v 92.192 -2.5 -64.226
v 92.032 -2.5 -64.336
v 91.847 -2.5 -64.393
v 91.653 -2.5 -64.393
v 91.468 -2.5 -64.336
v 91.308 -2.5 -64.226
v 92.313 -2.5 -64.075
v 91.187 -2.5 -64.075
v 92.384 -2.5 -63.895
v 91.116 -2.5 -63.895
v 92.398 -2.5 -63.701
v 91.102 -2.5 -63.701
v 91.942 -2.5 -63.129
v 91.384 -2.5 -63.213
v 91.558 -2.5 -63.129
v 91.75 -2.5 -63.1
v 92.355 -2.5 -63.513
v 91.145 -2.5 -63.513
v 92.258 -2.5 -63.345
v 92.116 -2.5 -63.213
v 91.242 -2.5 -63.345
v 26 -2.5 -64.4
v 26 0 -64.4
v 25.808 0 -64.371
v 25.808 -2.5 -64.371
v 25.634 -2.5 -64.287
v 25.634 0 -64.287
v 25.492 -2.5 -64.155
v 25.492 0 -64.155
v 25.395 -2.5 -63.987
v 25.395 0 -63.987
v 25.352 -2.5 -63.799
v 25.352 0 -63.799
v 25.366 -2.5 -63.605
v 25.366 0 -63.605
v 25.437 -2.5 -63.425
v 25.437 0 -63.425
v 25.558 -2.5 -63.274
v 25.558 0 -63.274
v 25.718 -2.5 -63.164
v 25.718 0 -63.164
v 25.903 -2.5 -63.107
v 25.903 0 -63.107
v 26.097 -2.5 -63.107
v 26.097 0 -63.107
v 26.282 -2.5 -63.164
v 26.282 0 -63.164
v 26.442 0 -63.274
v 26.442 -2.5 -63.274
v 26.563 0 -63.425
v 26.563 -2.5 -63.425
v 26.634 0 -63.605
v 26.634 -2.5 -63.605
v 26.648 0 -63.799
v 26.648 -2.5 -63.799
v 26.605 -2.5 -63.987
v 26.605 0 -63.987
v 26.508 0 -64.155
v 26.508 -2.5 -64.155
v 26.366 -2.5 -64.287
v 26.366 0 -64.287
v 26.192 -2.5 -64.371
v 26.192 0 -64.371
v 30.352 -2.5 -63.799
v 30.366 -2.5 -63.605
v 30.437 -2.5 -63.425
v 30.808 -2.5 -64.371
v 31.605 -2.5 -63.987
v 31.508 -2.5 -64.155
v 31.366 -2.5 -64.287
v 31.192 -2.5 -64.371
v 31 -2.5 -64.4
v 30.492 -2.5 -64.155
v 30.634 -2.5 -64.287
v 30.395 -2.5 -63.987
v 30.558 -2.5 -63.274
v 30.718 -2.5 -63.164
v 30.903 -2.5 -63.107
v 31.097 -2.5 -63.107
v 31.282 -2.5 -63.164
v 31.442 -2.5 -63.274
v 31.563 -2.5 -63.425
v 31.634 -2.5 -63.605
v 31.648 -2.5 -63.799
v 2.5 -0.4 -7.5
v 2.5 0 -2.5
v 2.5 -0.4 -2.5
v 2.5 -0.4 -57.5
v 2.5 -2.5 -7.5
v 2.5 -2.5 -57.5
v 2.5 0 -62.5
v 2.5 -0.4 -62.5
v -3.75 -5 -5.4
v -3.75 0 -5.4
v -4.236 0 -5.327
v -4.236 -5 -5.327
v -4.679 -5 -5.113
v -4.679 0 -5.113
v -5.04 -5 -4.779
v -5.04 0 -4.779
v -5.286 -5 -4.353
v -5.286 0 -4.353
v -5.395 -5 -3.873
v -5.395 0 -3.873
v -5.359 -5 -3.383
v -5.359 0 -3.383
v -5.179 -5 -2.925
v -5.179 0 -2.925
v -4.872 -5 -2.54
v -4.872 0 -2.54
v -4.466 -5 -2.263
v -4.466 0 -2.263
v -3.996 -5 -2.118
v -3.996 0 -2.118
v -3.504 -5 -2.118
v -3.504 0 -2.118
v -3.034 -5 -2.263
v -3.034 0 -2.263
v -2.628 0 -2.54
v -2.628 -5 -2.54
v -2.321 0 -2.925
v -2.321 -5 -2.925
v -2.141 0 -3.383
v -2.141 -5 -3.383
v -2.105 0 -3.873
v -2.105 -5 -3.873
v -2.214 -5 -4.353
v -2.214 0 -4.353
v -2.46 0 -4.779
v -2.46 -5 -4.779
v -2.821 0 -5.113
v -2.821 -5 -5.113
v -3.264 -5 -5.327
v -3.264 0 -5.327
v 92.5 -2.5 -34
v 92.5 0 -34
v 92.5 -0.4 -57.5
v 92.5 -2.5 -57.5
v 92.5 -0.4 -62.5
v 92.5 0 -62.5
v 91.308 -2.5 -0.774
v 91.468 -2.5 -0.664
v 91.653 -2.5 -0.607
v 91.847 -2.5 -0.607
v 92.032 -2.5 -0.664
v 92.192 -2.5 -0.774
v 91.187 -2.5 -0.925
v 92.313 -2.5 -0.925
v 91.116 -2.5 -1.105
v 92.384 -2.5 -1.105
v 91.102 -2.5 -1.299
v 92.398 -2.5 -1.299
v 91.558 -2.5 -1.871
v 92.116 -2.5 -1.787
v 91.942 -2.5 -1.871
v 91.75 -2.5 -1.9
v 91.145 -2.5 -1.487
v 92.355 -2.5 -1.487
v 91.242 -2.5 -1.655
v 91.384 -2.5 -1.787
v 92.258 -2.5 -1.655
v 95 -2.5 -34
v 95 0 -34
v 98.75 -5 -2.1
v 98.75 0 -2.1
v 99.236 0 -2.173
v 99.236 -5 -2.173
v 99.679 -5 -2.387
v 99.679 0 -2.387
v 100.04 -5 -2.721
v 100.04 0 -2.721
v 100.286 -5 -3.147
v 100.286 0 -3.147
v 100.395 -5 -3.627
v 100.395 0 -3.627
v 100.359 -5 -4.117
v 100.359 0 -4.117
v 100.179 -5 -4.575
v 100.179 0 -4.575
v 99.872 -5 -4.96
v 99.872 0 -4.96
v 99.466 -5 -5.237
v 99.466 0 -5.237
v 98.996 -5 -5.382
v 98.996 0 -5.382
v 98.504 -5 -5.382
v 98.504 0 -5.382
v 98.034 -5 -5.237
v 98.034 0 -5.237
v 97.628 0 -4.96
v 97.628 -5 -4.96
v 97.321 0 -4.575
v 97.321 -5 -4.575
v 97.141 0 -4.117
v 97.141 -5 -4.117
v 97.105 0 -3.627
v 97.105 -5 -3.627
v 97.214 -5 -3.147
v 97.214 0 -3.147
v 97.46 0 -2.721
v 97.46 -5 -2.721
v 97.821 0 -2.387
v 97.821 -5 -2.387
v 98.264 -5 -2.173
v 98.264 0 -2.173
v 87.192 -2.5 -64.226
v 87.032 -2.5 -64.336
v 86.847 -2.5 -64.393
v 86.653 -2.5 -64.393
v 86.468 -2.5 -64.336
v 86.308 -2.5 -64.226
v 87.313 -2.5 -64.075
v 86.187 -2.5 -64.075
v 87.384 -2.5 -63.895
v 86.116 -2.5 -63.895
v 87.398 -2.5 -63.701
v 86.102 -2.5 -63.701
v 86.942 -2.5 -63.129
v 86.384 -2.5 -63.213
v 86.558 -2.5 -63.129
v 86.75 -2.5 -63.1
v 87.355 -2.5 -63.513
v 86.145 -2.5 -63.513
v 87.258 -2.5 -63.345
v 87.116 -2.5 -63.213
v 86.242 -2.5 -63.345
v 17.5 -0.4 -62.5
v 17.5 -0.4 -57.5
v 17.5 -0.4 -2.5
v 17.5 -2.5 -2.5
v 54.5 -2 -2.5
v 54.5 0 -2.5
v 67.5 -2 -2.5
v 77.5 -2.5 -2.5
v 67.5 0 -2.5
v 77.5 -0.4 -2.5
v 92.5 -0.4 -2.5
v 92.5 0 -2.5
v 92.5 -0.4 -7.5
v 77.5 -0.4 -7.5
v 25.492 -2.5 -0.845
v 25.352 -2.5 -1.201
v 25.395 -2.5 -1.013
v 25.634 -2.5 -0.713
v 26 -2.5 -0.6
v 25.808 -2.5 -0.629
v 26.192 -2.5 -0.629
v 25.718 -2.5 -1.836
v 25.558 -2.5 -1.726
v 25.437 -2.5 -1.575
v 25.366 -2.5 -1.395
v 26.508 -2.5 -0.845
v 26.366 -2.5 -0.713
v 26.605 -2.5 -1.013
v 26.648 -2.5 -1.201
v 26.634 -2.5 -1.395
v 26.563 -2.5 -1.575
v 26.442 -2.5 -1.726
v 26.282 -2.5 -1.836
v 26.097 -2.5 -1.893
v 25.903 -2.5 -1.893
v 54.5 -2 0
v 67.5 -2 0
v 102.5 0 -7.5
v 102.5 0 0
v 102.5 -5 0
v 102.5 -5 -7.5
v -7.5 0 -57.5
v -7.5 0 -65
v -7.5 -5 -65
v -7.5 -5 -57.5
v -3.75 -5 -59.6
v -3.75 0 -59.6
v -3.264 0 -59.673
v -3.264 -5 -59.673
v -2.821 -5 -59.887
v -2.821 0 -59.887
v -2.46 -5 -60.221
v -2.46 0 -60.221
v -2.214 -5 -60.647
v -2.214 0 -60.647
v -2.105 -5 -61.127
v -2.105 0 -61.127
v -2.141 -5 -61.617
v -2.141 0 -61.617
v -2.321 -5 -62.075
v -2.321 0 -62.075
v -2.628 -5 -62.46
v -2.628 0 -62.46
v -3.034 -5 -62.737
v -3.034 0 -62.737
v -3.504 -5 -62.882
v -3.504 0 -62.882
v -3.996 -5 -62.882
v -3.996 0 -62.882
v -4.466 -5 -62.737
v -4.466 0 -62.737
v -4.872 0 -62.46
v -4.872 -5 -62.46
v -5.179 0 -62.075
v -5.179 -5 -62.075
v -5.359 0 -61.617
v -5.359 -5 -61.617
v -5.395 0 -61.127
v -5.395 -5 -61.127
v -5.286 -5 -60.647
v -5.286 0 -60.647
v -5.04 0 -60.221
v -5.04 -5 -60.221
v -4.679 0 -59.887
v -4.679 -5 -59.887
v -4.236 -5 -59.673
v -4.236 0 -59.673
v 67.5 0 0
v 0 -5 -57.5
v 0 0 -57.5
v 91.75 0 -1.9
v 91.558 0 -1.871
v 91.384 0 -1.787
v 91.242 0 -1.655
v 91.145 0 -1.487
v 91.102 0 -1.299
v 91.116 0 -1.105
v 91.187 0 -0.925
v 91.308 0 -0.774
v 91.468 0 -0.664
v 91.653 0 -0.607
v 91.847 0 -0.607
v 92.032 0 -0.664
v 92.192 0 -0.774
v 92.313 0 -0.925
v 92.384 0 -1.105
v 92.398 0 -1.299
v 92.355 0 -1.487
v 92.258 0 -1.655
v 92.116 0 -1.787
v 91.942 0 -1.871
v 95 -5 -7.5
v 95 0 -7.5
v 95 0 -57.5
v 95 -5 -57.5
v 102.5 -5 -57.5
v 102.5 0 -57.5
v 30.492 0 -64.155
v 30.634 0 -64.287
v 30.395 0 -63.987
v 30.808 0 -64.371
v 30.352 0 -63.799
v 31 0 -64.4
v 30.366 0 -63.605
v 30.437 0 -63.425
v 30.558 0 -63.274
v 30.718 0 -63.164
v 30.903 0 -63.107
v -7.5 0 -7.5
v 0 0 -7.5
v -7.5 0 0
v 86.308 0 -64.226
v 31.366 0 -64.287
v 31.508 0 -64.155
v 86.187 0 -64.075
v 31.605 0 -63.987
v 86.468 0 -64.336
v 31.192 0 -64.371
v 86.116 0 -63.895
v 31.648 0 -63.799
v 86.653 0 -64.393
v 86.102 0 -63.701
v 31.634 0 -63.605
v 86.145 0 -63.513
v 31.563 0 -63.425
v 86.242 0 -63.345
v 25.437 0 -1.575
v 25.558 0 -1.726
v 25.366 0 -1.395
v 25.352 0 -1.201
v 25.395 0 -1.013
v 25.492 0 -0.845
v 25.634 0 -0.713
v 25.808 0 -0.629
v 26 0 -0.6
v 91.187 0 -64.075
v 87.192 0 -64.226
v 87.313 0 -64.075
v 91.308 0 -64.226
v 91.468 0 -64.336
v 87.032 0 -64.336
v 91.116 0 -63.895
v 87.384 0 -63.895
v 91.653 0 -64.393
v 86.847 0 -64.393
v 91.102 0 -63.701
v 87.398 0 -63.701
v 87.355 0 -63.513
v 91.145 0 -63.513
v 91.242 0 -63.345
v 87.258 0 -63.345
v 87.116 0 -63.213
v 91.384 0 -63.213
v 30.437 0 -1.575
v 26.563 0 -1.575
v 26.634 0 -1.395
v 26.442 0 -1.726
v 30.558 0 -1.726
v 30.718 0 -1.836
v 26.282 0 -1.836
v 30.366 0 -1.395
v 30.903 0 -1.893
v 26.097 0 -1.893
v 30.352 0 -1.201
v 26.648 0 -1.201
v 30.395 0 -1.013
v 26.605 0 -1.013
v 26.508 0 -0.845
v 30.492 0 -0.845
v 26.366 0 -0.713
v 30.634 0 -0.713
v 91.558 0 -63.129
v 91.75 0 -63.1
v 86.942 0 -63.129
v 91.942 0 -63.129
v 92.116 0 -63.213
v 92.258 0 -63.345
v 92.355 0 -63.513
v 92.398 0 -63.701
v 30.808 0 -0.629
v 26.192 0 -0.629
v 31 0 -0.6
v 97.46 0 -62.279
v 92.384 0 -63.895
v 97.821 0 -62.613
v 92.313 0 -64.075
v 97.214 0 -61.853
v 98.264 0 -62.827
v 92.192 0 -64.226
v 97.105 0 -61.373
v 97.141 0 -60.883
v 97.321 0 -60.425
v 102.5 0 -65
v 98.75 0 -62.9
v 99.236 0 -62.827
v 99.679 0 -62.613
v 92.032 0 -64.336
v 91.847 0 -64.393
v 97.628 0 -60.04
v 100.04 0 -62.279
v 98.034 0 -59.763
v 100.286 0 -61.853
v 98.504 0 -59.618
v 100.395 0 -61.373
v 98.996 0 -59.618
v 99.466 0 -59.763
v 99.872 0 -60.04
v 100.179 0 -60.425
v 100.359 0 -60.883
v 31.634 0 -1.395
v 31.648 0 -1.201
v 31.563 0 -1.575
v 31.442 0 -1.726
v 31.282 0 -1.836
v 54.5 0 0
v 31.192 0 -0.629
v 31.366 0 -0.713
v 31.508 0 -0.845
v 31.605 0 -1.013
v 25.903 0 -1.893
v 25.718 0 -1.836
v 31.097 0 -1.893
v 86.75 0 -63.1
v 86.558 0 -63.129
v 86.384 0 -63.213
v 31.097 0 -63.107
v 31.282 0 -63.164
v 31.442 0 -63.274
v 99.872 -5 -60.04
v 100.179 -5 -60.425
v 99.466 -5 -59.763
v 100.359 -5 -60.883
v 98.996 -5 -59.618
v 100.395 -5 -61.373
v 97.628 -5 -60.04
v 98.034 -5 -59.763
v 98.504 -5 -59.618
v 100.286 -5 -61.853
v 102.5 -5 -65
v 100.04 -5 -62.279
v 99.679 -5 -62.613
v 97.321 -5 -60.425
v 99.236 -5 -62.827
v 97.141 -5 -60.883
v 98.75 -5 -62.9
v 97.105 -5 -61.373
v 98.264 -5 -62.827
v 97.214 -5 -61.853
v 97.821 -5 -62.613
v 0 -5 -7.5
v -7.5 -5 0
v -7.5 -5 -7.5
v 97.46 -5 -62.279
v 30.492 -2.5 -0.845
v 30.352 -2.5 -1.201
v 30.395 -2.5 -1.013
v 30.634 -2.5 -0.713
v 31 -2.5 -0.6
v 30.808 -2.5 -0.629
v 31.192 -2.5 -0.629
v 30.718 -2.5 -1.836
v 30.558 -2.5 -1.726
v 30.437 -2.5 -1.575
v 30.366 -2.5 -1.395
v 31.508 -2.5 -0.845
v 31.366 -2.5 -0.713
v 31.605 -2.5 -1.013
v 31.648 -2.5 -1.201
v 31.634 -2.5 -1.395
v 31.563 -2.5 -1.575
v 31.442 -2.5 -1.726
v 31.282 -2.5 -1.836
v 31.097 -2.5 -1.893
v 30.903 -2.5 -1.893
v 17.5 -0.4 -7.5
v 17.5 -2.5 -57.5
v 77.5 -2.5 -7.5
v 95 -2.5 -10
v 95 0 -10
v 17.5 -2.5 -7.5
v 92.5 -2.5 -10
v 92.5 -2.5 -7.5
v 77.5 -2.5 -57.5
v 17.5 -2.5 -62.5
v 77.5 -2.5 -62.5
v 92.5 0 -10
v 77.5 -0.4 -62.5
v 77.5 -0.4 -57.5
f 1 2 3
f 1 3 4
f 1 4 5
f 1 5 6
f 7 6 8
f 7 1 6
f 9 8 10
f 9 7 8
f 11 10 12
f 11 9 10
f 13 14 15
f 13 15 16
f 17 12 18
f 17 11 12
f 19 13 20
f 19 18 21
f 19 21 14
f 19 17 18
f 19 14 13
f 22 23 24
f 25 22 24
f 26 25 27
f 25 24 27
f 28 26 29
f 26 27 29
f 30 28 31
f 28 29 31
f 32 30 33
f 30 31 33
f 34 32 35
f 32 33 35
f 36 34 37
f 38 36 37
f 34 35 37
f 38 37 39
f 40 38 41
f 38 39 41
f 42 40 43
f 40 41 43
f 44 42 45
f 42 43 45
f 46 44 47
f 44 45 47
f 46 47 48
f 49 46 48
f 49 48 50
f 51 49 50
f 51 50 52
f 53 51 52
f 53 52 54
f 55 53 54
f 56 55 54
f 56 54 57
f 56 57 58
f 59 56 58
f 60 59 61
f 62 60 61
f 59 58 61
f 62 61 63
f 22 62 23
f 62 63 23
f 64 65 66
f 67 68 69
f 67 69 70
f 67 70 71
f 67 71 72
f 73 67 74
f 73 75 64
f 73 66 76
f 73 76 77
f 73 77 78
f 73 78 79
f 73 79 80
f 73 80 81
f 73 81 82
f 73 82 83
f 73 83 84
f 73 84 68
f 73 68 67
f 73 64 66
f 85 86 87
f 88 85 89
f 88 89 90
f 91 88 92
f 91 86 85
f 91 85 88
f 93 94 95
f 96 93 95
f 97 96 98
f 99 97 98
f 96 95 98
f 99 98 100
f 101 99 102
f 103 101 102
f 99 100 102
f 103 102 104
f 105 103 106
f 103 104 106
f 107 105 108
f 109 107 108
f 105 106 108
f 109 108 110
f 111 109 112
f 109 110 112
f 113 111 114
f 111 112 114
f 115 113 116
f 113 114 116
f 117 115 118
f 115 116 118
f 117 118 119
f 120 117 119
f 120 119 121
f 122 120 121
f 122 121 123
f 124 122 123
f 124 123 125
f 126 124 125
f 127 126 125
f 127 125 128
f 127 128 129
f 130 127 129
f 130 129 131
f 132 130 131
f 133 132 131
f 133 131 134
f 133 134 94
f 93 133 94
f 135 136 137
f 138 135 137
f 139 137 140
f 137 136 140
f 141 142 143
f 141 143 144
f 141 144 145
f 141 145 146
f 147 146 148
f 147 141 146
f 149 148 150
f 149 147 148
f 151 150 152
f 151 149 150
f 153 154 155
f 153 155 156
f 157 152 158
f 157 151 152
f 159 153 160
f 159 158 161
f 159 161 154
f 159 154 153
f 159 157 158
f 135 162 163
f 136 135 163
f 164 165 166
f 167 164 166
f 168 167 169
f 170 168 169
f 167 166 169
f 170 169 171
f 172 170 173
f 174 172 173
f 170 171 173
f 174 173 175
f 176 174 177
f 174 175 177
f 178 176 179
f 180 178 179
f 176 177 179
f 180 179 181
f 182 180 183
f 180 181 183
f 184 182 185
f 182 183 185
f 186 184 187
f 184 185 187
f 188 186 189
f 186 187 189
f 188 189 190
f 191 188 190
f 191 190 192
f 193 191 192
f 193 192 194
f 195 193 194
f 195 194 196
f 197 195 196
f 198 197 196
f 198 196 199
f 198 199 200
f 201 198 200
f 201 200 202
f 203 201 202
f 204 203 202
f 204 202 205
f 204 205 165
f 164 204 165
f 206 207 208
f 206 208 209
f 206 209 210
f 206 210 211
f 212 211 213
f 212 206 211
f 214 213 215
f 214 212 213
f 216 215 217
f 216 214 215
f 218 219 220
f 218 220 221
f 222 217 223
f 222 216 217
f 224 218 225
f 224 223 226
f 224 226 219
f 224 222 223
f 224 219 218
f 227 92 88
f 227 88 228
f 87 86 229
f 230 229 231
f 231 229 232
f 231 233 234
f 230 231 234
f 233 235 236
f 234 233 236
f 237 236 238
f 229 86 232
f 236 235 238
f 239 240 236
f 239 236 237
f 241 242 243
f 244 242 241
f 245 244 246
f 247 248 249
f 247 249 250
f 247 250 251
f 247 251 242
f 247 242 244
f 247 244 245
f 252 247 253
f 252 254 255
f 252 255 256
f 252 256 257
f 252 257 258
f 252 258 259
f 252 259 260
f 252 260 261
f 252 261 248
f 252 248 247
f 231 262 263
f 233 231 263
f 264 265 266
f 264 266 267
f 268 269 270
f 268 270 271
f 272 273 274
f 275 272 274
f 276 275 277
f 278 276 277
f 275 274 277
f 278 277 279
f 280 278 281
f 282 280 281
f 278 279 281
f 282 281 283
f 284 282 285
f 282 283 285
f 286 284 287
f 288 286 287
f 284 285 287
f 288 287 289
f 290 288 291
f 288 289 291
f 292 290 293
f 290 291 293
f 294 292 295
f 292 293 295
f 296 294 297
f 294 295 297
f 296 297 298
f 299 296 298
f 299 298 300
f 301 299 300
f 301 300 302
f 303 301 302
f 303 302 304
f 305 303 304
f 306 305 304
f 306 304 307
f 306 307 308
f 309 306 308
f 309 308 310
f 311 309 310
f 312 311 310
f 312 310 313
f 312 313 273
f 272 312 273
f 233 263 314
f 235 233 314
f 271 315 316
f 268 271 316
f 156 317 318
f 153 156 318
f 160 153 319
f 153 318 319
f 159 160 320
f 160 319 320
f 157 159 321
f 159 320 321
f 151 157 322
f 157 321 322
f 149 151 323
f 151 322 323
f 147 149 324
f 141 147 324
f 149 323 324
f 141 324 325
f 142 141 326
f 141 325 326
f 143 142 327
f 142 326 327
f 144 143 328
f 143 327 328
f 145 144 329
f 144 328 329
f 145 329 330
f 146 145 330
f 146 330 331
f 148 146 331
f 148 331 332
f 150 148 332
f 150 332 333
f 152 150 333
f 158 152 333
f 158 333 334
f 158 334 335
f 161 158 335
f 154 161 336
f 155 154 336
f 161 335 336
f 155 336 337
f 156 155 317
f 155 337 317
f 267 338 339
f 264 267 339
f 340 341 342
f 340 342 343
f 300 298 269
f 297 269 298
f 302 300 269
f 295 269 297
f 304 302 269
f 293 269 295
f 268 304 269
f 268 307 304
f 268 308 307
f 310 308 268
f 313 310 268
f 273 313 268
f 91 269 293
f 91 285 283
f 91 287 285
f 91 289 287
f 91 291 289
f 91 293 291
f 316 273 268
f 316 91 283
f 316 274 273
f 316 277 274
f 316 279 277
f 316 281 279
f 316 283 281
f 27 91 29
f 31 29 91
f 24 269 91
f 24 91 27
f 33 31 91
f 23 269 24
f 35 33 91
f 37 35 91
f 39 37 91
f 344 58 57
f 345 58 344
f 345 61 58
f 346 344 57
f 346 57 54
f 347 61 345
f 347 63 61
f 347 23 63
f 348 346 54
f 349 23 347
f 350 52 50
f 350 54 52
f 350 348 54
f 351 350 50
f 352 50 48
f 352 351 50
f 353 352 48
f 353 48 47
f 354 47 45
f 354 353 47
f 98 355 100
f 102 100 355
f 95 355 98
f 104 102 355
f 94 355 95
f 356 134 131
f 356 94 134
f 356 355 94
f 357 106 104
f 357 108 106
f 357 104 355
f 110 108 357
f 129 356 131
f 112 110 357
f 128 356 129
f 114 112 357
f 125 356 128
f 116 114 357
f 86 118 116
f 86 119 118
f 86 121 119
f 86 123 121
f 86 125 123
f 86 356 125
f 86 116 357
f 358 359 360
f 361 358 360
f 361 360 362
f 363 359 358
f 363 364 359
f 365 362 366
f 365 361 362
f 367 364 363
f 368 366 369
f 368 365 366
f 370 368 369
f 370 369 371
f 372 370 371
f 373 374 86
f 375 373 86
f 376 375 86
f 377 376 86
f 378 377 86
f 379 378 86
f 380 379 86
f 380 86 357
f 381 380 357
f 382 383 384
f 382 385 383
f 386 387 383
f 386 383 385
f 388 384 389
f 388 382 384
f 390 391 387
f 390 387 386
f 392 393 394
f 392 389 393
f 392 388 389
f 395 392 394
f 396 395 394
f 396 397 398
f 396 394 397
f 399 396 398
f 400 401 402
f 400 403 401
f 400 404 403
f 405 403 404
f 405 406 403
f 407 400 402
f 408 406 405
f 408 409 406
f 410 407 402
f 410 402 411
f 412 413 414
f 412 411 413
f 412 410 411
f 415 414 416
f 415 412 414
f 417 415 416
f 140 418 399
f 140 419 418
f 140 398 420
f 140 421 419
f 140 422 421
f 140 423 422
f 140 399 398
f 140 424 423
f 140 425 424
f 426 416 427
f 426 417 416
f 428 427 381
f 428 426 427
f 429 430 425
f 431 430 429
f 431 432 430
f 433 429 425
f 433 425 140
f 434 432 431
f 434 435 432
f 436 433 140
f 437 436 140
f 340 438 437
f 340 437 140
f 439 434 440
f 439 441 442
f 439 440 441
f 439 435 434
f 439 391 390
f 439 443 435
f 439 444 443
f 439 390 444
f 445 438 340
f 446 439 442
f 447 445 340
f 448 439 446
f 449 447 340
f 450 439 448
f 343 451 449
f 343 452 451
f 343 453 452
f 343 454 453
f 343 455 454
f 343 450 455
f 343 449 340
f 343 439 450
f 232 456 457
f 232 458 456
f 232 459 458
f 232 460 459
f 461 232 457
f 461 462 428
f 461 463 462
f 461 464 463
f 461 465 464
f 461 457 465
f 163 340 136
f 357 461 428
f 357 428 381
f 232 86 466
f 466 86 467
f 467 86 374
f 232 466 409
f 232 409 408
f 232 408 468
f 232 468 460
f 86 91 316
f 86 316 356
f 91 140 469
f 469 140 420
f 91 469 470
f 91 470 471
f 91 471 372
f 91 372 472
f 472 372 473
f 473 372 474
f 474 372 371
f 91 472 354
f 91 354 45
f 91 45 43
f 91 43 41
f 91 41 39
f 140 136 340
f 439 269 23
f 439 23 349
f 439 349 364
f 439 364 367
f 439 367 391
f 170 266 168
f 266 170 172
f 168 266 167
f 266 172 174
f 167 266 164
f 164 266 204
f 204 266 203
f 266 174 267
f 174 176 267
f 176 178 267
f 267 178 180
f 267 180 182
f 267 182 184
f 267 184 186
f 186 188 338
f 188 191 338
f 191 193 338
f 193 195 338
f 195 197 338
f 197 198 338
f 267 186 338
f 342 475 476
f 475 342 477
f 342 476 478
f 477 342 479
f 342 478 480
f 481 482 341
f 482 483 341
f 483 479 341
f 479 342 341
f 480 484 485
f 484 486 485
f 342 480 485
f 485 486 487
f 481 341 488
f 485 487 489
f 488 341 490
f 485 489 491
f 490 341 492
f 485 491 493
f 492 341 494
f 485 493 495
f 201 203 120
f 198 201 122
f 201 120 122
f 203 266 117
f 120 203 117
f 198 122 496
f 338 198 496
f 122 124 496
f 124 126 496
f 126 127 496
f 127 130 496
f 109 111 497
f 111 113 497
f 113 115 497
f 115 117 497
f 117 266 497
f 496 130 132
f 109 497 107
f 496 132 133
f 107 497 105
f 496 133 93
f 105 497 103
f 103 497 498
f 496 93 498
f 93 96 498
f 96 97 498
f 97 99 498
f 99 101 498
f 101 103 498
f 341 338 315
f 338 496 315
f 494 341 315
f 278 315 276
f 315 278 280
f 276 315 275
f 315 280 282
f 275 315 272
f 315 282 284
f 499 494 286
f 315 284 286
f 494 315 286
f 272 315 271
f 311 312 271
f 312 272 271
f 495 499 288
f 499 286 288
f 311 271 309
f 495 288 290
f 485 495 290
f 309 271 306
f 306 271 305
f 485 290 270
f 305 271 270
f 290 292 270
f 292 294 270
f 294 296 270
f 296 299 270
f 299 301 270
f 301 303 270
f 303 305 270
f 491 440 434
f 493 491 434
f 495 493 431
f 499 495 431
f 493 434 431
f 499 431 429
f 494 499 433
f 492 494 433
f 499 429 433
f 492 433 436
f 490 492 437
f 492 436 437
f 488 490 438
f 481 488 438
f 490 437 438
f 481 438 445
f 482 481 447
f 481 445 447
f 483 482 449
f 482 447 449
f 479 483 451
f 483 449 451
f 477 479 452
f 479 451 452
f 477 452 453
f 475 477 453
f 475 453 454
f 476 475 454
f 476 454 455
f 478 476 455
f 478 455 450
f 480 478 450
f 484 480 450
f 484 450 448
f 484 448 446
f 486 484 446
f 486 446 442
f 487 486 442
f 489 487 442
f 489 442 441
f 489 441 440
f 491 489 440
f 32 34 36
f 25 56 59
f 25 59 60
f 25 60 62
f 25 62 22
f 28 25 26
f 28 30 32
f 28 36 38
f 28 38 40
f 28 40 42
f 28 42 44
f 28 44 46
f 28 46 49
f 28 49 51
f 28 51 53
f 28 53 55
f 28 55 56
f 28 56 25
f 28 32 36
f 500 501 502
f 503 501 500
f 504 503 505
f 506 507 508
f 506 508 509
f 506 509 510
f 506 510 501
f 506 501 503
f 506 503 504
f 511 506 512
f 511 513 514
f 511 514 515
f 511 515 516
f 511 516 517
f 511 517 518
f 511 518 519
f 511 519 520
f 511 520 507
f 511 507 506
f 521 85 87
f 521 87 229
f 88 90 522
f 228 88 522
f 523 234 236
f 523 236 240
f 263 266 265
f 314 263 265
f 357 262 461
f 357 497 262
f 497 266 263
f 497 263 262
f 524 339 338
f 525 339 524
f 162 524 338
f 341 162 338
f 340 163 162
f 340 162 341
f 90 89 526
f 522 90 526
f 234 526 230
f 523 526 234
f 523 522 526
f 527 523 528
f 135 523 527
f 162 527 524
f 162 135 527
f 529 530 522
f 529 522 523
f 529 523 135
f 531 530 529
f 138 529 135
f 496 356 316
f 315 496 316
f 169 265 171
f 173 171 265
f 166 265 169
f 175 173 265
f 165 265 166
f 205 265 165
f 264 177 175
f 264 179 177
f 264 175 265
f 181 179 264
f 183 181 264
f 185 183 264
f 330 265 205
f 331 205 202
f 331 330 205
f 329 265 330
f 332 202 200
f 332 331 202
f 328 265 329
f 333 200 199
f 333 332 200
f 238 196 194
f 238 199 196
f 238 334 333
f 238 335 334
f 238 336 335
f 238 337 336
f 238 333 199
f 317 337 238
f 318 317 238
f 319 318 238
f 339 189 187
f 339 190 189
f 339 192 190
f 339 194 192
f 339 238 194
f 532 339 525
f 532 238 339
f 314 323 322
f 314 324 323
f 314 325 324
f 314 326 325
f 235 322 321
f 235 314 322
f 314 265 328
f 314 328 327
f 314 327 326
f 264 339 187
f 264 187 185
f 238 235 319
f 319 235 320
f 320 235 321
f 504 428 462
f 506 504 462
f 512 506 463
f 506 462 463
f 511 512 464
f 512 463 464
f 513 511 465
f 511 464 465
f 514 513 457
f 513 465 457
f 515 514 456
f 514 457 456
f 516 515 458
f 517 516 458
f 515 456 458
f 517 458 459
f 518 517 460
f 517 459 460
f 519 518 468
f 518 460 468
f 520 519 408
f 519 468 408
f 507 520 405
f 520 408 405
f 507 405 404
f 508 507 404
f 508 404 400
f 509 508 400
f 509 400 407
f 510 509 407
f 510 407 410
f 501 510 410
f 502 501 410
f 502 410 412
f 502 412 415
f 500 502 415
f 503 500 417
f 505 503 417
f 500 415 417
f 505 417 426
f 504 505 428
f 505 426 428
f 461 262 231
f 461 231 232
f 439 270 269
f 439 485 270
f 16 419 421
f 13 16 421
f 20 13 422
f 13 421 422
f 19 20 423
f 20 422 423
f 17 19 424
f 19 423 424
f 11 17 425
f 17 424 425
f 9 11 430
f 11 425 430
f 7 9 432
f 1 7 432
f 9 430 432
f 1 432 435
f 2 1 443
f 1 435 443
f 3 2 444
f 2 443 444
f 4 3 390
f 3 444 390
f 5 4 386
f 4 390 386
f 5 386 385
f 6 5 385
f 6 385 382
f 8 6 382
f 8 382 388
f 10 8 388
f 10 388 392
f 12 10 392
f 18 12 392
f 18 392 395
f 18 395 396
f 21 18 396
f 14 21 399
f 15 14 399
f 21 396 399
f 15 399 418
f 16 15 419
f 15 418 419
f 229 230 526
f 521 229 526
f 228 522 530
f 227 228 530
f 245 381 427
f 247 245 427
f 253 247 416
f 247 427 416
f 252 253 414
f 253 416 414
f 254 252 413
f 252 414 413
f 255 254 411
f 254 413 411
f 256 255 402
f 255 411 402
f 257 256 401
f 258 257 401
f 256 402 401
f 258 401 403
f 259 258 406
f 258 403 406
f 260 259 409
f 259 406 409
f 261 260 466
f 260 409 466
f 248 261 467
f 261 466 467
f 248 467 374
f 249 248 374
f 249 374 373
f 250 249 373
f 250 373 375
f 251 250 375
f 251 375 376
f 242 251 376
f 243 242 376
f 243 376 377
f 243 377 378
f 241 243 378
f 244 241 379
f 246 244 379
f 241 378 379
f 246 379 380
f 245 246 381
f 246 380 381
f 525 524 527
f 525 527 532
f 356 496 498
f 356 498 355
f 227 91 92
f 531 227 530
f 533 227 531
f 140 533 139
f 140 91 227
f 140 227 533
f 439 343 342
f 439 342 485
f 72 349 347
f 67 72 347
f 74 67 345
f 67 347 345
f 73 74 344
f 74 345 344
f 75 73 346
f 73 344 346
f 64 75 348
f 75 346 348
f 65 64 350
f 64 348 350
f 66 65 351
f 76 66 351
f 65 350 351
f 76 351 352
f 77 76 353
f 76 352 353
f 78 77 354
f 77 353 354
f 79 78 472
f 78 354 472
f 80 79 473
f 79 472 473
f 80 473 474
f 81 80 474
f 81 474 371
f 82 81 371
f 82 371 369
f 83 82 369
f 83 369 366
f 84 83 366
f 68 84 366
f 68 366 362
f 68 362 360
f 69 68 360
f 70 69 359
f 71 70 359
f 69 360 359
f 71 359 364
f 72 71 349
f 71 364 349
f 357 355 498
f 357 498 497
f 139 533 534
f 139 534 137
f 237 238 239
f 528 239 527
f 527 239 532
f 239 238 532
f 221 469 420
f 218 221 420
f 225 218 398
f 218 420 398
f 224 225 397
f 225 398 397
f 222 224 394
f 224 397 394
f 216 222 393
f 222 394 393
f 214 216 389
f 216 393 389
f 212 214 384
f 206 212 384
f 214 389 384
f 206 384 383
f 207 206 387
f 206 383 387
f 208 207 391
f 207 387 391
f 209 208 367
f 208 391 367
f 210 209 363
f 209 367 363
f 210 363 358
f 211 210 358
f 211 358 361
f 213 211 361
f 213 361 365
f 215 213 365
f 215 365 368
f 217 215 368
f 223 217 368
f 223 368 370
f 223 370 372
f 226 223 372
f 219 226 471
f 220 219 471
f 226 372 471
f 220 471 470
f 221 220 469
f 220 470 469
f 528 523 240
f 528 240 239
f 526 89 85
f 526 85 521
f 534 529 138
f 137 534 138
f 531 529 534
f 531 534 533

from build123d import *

# Parameters (mm, degrees)
SKETCH1_W           = 95
SKETCH1_H           = 65
BOSS_EXTRUDE1_DEPTH = 5
SKETCH3_W           = 90
SKETCH3_H           = 60
CUT_EXTRUDE1_DEPTH  = 2.5
SKETCH5_W           = 15
SKETCH5_H           = 5
BOSS_EXTRUDE2_DEPTH = 2.1
SKETCH14_W          = 13
SKETCH14_H          = 2
CUT_EXTRUDE3_DEPTH  = 2.5
CUT_EXTRUDE5_REACH  = 117.217
SKETCH17_W          = 24
SKETCH17_H          = 2.5
SKETCH18_R          = 0.65
CUT_EXTRUDE6_DEPTH  = 2.5
SKETCH19_W          = 7.5
SKETCH19_H          = 5
BOSS_EXTRUDE3_DEPTH = 7.5
SKETCH20_W          = 7.5
SKETCH20_H          = 5
BOSS_EXTRUDE4_DEPTH = 7.5
SKETCH21_R          = 1.65
CUT_EXTRUDE7_DEPTH  = 122.475306133


with BuildPart() as part:
    # Sketch1 → Boss-Extrude1 (new body)
    with BuildSketch(Plane(origin=(0, 0, 0), x_dir=(1, 0, 0), z_dir=(0, 1, 0))):
        with Locations((47.5, 32.5)):
            Rectangle(SKETCH1_W, SKETCH1_H)
    extrude(amount=-BOSS_EXTRUDE1_DEPTH)

    # Sketch3 → Cut-Extrude1 (cut)
    with BuildSketch(Plane(origin=(0, 0, 0), x_dir=(1, 0, 0), z_dir=(0, 1, 0))):
        with Locations((47.5, 32.5)):
            Rectangle(SKETCH3_W, SKETCH3_H)
    extrude(amount=-CUT_EXTRUDE1_DEPTH, mode=Mode.SUBTRACT)

    # Sketch5 → Boss-Extrude2 (add)
    with BuildSketch(Plane(origin=(0, -2.5, 0), x_dir=(1, 0, 0), z_dir=(0, 1, 0))):
        with Locations((10, 60)):
            Rectangle(SKETCH5_W, SKETCH5_H)
        with Locations((10, 5)):
            Rectangle(SKETCH5_W, SKETCH5_H)
        with Locations((85, 60)):
            Rectangle(SKETCH5_W, SKETCH5_H)
        with Locations((85, 5)):
            Rectangle(SKETCH5_W, SKETCH5_H)
    extrude(amount=BOSS_EXTRUDE2_DEPTH)

    # Sketch14 → Cut-Extrude3 (cut)
    with BuildSketch(Plane.XY):
        with Locations((61, -1)):
            Rectangle(SKETCH14_W, SKETCH14_H)
    extrude(amount=-CUT_EXTRUDE3_DEPTH, mode=Mode.SUBTRACT)

    # Sketch17 → Cut-Extrude5 (cut, up to next)
    with BuildSketch(Plane(origin=(95, 0, 0), x_dir=(0, 0, -1), z_dir=(1, 0, 0)), mode=Mode.PRIVATE) as cut_extrude5_sk1:
        with Locations((22, -1.25)):
            Rectangle(SKETCH17_W, SKETCH17_H)
    cut_extrude5_tool1 = extrude(cut_extrude5_sk1.sketch, amount=-CUT_EXTRUDE5_REACH, mode=Mode.PRIVATE) & part.part
    add(cut_extrude5_tool1.solids().sort_by_distance((95, -1.25, -22))[0], mode=Mode.SUBTRACT)

    # Sketch18 → Cut-Extrude6 (cut)
    with BuildSketch(Plane(origin=(0, 0, 0), x_dir=(1, 0, 0), z_dir=(0, 1, 0))):
        with Locations(Location((91.75, 63.75, 0), (0, 0, 270))):
            Circle(SKETCH18_R)
        with Locations(Location((86.75, 63.75, 0), (0, 0, 270))):
            Circle(SKETCH18_R)
        with Locations(Location((91.75, 1.25, 0), (0, 0, 90))):
            Circle(SKETCH18_R)
        with Locations(Location((26, 63.75, 0), (0, 0, 90))):
            Circle(SKETCH18_R)
        with Locations(Location((31, 63.75, 0), (0, 0, 90))):
            Circle(SKETCH18_R)
        with Locations(Location((26, 1.25, 0), (0, 0, 270))):
            Circle(SKETCH18_R)
        with Locations(Location((31, 1.25, 0), (0, 0, 270))):
            Circle(SKETCH18_R)
    extrude(amount=-CUT_EXTRUDE6_DEPTH, mode=Mode.SUBTRACT)

    # Sketch19 → Boss-Extrude3 (add)
    with BuildSketch(Plane.ZY):
        with Locations((-61.25, -2.5)):
            Rectangle(SKETCH19_W, SKETCH19_H)
        with Locations((-3.75, -2.5)):
            Rectangle(SKETCH19_W, SKETCH19_H)
    extrude(amount=BOSS_EXTRUDE3_DEPTH)

    # Sketch20 → Boss-Extrude4 (add)
    with BuildSketch(Plane(origin=(95, 0, 0), x_dir=(0, 0, -1), z_dir=(1, 0, 0))):
        with Locations((3.75, -2.5)):
            Rectangle(SKETCH20_W, SKETCH20_H)
        with Locations((61.25, -2.5)):
            Rectangle(SKETCH20_W, SKETCH20_H)
    extrude(amount=BOSS_EXTRUDE4_DEPTH)

    # Sketch21 → Cut-Extrude7 (cut, through all)
    with BuildSketch(Plane(origin=(0, 0, 0), x_dir=(1, 0, 0), z_dir=(0, 1, 0))):
        with Locations(Location((-3.75, 61.25, 0), (0, 0, 270))):
            Circle(SKETCH21_R)
        with Locations(Location((98.75, 61.25, 0), (0, 0, 90))):
            Circle(SKETCH21_R)
        with Locations(Location((98.75, 3.75, 0), (0, 0, 270))):
            Circle(SKETCH21_R)
        with Locations(Location((-3.75, 3.75, 0), (0, 0, 90))):
            Circle(SKETCH21_R)
    extrude(amount=-CUT_EXTRUDE7_DEPTH, mode=Mode.SUBTRACT)


solid = part.part
